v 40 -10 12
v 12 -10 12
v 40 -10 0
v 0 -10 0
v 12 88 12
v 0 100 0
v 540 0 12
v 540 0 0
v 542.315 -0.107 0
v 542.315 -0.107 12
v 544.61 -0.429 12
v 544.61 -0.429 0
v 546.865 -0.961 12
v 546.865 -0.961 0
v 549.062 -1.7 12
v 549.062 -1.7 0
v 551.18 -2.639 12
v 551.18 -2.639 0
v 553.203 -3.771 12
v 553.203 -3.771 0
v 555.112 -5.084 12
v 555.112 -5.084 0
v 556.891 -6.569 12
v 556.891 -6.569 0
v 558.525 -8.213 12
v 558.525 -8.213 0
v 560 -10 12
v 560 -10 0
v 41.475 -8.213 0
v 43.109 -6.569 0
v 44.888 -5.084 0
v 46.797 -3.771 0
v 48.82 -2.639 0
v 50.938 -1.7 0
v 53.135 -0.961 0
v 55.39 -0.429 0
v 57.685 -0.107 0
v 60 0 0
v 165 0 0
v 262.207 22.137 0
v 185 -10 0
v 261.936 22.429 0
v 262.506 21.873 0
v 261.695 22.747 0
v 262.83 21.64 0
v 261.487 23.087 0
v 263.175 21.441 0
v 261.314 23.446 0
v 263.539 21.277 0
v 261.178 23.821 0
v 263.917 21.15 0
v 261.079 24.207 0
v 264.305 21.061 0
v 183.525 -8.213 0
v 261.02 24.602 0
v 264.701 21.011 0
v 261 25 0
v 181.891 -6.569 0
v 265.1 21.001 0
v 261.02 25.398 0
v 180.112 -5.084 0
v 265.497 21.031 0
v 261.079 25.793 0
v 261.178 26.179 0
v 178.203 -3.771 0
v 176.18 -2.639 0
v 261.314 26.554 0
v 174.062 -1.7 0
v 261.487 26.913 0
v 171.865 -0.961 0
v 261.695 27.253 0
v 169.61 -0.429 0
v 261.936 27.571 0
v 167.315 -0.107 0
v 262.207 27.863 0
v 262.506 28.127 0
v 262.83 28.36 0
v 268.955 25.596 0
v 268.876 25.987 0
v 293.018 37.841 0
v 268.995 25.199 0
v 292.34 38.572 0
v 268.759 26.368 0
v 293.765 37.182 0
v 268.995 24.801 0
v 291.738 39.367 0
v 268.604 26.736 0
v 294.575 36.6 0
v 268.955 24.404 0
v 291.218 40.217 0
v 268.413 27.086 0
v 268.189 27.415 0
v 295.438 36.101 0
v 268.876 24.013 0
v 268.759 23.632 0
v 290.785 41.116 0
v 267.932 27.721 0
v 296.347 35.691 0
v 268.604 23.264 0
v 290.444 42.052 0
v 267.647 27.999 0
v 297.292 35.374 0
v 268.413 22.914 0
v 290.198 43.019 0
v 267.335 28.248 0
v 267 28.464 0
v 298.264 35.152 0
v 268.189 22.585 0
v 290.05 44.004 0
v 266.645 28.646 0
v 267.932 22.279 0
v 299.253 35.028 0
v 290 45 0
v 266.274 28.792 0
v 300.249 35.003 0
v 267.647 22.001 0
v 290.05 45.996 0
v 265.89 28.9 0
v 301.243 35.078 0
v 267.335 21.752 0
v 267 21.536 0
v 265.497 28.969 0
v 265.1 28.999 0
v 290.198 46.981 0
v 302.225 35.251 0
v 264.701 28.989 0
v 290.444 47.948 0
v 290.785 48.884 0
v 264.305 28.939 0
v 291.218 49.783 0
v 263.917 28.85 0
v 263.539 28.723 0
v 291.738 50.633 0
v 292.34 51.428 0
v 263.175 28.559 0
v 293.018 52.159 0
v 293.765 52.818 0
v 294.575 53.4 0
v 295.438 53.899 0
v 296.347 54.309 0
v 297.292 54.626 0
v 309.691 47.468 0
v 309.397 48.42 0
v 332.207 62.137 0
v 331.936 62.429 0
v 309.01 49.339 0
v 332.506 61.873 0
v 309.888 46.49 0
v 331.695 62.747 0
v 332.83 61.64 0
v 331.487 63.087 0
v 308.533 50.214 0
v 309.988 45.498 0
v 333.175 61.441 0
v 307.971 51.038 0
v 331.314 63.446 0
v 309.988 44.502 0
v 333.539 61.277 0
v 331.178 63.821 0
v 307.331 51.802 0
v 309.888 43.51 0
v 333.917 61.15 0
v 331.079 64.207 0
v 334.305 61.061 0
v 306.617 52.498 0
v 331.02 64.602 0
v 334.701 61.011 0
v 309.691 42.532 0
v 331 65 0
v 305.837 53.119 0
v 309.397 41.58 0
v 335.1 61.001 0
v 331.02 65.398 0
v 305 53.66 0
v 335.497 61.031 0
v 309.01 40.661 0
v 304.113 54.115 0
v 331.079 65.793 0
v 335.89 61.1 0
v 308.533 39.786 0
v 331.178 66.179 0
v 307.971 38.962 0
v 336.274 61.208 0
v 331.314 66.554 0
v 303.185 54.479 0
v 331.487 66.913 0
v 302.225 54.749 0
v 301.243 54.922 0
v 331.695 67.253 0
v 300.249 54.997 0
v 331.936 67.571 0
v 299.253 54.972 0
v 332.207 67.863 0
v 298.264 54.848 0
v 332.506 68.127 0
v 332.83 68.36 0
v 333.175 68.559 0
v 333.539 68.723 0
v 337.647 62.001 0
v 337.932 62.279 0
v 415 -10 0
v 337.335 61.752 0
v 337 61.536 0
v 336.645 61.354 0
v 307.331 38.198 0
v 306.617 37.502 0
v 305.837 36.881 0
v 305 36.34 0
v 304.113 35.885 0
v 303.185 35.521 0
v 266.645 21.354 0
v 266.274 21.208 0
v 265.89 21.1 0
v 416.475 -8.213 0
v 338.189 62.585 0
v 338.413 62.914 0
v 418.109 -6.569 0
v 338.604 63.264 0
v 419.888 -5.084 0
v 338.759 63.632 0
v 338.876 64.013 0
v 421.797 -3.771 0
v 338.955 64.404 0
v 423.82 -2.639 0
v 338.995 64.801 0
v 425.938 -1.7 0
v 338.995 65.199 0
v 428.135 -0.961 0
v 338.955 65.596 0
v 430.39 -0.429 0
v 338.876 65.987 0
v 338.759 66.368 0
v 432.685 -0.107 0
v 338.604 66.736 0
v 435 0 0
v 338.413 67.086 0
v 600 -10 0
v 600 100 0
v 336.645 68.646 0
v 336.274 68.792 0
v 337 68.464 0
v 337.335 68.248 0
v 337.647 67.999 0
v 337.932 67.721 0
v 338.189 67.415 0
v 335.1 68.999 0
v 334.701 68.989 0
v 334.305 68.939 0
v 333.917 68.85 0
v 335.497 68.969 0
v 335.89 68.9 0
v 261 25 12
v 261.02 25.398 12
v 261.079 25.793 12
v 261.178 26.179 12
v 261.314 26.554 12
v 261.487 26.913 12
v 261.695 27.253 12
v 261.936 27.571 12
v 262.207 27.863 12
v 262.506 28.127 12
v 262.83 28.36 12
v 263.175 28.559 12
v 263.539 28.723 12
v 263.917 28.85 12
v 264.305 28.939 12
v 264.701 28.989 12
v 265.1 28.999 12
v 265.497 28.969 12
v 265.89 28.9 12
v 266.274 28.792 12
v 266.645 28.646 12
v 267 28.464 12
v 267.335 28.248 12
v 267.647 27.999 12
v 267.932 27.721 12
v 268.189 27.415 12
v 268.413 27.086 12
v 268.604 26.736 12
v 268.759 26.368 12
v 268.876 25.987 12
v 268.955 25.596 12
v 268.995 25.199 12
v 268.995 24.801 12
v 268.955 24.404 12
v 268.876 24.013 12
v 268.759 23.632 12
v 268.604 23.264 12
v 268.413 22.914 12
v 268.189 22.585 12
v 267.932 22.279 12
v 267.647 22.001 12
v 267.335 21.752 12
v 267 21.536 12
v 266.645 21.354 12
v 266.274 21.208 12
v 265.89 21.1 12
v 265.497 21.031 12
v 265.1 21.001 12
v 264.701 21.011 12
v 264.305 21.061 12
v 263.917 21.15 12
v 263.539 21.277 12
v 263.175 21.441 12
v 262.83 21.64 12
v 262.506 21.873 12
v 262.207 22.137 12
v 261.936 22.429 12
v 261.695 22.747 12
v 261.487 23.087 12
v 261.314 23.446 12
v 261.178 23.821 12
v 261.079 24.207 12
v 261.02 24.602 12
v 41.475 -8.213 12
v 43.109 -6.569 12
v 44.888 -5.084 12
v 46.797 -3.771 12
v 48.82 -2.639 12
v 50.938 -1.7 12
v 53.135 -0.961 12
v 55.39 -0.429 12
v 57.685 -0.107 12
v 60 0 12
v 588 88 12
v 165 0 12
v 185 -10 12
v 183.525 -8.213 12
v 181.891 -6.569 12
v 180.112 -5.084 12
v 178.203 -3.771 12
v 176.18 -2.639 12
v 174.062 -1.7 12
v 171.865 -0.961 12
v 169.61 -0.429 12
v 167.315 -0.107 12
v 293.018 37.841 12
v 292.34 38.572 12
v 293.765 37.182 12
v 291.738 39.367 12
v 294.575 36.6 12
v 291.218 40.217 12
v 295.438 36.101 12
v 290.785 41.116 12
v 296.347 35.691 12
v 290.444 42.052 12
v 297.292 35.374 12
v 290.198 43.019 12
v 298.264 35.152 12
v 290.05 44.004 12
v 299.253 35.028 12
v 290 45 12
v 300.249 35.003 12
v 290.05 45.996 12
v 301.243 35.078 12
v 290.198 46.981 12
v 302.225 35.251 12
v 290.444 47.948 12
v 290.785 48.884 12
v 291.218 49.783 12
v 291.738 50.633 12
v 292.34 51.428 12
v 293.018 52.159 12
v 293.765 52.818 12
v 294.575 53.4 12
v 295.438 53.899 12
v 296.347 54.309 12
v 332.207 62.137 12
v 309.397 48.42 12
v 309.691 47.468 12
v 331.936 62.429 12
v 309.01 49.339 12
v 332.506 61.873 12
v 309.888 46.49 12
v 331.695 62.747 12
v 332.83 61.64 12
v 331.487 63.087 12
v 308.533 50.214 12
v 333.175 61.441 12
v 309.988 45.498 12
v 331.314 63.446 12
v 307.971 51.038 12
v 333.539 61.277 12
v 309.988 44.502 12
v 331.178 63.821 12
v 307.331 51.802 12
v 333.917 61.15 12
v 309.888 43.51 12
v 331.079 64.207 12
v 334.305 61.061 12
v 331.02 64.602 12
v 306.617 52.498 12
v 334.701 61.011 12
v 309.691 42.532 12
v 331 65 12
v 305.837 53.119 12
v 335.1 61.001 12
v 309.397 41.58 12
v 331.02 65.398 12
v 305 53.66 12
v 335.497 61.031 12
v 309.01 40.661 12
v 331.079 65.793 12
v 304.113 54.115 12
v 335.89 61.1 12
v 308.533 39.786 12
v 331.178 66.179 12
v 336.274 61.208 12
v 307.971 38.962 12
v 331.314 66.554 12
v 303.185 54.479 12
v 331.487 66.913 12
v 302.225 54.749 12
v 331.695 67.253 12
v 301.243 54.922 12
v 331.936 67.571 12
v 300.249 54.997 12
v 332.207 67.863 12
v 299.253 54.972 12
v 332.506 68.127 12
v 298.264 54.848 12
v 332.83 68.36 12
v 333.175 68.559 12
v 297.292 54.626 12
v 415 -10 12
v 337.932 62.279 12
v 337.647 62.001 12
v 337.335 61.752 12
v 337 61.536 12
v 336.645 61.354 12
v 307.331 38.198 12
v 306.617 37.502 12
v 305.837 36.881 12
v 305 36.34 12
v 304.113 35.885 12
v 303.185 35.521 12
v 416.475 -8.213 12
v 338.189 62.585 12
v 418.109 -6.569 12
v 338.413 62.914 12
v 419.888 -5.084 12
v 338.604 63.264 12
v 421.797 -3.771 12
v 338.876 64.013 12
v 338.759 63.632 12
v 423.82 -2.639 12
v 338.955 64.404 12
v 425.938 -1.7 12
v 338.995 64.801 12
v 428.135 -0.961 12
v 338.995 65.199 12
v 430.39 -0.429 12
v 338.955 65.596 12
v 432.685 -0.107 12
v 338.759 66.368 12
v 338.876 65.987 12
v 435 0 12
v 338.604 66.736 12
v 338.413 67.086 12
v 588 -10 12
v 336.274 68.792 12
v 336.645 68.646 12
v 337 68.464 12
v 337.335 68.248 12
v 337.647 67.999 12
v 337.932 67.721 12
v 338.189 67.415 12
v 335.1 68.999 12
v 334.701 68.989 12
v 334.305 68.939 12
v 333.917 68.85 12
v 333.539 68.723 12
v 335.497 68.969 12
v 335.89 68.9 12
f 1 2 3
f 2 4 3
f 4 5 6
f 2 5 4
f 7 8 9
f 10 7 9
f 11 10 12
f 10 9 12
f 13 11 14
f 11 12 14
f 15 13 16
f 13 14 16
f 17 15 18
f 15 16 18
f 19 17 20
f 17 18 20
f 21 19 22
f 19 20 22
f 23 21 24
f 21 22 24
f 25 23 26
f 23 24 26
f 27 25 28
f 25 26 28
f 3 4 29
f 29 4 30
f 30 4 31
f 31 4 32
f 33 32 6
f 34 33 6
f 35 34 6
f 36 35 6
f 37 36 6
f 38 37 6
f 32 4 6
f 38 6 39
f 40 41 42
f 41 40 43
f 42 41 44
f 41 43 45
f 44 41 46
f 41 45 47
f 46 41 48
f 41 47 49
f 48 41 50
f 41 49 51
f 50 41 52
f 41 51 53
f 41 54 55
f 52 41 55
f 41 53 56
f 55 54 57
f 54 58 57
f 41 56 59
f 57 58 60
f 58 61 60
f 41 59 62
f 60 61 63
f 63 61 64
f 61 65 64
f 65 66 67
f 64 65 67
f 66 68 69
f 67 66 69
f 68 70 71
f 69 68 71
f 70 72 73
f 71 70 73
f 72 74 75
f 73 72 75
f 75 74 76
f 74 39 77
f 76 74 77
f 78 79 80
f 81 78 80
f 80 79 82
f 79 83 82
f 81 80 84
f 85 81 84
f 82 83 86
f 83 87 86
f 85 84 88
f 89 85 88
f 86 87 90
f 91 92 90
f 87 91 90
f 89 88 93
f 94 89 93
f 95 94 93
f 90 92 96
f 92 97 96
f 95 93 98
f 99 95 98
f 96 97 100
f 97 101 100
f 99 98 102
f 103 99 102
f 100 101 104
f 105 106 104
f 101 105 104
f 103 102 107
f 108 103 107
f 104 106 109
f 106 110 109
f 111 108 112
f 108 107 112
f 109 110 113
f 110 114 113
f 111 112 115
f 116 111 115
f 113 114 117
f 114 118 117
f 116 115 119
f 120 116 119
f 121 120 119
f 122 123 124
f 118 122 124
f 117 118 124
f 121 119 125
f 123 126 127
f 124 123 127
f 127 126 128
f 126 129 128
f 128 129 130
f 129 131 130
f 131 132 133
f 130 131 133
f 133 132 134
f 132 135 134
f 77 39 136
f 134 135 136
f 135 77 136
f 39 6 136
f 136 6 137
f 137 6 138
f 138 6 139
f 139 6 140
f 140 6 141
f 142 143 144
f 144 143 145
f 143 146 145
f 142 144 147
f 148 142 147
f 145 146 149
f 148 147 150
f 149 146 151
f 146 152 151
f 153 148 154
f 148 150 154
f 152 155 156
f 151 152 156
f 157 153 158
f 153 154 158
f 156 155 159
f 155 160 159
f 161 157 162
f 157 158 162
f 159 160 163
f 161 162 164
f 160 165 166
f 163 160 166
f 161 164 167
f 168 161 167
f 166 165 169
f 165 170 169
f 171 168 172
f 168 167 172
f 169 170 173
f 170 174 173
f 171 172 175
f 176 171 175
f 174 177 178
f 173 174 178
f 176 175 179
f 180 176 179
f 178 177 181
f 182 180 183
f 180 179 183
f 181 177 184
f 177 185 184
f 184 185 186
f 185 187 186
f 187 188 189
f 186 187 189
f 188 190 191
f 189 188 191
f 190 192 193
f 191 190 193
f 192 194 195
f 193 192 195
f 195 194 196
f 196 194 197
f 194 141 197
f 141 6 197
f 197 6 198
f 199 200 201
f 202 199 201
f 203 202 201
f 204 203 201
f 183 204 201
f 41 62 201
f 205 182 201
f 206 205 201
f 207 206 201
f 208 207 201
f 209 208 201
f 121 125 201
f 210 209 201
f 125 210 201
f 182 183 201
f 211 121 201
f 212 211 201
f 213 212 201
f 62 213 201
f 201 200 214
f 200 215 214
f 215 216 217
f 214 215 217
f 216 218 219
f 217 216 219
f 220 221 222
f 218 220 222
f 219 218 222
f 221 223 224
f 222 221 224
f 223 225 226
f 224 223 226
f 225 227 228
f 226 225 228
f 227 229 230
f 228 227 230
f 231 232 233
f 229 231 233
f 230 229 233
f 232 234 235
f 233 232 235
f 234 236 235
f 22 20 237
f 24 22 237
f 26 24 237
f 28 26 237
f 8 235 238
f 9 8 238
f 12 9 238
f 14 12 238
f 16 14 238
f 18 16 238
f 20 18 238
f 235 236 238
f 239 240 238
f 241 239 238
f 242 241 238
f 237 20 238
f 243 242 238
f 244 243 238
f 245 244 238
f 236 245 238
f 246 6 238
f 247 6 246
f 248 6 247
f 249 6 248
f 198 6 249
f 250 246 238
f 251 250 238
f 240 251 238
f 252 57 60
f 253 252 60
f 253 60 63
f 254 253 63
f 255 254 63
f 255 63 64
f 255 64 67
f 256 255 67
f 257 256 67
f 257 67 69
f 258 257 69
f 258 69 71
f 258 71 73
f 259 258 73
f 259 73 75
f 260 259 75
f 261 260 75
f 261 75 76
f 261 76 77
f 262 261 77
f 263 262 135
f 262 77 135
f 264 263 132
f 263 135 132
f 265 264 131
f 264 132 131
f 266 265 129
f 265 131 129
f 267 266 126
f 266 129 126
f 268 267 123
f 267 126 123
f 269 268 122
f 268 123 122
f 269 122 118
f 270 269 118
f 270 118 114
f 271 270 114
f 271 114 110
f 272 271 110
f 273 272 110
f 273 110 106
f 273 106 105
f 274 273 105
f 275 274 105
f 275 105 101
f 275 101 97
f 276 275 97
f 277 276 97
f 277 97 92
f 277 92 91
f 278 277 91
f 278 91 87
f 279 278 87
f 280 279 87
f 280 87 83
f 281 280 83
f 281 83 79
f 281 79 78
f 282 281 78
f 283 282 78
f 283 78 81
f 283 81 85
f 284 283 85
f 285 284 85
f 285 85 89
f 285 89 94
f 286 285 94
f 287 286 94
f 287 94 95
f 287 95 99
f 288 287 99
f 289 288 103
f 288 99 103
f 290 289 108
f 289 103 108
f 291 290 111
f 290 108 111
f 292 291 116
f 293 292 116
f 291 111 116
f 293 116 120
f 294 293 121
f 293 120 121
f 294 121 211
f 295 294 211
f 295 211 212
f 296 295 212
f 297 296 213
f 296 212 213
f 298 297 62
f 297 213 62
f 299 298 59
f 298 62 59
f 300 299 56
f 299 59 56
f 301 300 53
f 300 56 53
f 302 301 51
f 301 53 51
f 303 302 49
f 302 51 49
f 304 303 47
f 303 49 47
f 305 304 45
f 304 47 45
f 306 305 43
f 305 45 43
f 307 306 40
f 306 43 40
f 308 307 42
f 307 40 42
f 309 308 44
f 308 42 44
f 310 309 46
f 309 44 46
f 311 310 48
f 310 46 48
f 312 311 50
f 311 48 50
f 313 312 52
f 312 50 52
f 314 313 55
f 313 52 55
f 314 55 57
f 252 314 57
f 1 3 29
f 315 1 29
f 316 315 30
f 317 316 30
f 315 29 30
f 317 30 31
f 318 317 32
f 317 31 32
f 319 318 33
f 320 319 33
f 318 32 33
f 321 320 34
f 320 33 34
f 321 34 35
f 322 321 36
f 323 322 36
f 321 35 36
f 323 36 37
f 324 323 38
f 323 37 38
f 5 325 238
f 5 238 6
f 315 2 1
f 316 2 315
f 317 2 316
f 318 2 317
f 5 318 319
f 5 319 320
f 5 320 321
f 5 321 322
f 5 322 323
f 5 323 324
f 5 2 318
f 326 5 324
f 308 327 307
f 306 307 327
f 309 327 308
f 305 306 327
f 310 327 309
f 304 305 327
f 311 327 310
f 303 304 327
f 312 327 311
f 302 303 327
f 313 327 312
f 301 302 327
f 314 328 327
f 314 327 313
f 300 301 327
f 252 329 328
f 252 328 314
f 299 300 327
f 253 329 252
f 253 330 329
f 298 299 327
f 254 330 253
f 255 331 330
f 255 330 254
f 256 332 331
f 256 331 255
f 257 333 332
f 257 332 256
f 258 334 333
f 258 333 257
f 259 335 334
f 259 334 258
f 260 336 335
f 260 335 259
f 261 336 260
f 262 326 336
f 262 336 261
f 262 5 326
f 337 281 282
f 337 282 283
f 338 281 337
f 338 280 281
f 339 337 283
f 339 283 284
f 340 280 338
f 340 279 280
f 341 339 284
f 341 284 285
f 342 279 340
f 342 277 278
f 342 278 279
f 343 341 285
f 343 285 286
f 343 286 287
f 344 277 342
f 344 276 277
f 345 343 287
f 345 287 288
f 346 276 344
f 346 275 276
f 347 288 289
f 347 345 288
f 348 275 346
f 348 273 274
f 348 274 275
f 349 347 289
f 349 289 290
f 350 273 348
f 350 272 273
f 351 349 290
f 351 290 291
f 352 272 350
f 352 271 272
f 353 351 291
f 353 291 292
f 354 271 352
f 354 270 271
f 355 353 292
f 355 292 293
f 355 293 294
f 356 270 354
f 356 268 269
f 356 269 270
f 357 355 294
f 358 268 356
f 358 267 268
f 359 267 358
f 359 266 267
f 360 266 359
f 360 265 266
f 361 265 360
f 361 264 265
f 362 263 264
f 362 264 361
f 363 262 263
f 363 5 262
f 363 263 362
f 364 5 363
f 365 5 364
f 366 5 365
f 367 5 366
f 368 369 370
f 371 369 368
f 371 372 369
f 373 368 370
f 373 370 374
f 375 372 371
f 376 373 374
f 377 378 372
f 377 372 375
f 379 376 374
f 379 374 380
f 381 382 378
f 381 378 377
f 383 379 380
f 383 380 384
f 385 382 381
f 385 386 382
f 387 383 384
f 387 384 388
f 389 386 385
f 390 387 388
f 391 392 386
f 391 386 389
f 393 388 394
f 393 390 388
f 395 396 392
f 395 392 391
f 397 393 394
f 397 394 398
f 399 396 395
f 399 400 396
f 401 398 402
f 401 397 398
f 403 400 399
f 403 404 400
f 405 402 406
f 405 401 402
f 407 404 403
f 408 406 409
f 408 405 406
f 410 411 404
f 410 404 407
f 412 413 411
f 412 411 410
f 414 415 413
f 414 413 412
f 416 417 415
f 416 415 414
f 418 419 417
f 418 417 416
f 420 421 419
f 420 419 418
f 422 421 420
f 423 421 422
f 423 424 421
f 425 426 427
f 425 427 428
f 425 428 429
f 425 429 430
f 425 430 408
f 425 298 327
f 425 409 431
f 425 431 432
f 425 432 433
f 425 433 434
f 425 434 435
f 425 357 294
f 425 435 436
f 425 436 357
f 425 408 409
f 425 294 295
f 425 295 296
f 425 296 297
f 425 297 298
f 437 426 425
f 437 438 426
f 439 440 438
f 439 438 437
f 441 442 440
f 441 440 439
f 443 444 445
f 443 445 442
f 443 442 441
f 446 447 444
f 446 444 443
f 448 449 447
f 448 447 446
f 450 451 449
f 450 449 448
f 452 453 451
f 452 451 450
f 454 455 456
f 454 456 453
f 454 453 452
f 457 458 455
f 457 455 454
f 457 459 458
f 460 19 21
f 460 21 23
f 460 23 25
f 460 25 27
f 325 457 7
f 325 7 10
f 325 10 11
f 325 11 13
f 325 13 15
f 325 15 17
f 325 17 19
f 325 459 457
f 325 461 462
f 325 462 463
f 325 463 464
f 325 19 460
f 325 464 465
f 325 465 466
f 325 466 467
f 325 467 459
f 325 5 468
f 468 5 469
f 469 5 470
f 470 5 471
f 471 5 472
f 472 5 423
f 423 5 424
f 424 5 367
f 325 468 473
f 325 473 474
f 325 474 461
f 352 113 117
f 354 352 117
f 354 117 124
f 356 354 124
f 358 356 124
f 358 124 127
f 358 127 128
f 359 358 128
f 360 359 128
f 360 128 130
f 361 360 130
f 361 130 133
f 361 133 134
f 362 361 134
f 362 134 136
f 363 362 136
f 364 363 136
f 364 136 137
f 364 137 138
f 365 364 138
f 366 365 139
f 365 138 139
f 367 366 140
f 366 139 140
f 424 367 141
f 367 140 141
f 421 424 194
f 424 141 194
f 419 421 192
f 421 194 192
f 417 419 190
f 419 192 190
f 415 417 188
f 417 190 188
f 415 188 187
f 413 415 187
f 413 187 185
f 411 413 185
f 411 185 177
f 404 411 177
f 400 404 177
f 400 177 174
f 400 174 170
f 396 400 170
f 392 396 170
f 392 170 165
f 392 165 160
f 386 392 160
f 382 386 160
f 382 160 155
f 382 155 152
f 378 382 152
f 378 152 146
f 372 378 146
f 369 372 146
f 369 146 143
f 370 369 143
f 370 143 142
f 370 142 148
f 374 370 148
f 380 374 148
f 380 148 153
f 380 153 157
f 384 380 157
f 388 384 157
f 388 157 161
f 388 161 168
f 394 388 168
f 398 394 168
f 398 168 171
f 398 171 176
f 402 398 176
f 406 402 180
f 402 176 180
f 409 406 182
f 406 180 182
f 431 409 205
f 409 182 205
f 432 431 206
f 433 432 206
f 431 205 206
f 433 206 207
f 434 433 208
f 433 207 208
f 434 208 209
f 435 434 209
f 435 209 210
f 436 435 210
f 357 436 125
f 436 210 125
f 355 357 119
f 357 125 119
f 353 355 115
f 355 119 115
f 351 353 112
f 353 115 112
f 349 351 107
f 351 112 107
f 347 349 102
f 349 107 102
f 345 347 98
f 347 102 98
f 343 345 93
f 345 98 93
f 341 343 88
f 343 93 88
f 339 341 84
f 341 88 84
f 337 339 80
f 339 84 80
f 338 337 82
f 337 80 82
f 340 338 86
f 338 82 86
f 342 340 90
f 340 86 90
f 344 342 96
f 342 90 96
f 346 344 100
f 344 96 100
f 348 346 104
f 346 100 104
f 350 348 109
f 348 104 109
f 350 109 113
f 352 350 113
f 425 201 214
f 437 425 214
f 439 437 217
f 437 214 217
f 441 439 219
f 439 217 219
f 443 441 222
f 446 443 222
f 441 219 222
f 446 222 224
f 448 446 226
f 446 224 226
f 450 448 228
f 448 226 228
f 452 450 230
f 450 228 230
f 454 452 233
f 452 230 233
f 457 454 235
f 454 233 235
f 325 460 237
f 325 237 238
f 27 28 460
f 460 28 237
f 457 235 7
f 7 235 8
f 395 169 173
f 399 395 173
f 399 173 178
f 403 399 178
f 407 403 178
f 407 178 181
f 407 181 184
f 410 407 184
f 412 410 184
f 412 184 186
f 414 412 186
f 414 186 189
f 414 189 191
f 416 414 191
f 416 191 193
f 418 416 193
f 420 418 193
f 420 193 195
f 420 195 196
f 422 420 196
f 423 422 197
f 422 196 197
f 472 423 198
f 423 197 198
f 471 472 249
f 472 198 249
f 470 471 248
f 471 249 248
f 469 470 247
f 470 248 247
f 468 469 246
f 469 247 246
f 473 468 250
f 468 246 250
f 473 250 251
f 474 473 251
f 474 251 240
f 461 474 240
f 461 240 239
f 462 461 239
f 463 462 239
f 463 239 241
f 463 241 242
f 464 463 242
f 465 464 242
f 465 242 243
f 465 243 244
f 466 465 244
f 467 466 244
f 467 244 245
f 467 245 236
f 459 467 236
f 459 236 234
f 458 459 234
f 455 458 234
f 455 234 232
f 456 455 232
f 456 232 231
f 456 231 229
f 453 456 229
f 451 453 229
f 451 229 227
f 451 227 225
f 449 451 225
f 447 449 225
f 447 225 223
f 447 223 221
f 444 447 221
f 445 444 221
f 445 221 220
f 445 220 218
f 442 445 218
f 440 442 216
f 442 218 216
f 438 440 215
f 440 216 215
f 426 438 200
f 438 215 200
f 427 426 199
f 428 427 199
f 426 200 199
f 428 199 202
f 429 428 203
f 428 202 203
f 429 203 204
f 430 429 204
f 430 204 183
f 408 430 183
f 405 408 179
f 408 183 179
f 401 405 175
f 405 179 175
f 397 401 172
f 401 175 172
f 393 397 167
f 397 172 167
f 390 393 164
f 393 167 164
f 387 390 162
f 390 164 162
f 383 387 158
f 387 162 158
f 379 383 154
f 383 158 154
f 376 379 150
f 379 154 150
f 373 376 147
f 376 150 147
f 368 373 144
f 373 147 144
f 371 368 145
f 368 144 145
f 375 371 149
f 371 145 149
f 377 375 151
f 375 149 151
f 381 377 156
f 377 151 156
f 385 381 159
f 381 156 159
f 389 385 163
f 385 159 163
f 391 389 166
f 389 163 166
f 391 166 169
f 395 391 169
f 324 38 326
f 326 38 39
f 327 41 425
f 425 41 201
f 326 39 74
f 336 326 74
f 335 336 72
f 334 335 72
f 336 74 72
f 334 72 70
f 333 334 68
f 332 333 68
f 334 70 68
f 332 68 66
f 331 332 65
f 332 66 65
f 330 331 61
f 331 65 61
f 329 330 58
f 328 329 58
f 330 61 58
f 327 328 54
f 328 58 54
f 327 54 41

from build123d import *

# Parameters (mm, degrees)
BOSS_EXTRUDE1_DEPTH = 12
CHAMFER1_SIZE       = 12
SKETCH2_R           = 4
SKETCH2_R_2         = 10
CUT_EXTRUDE1_DEPTH  = 609.394608786


with BuildPart() as part:
    # Sketch1 → Boss-Extrude1 (new body)
    with BuildSketch(Plane.XY):
        with BuildLine():
            Line((0, 0), (0, -10))
            Line((0, -10), (40, -10))
            ThreePointArc((40, -10), (48.819660113, -2.639320225), (60, 0))
            Line((60, 0), (165, 0))
            ThreePointArc((165, 0), (176.180339887, -2.639320225), (185, -10))
            Line((185, -10), (415, -10))
            ThreePointArc((415, -10), (423.819660113, -2.639320225), (435, 0))
            Line((435, 0), (540, 0))
            ThreePointArc((540, 0), (551.180339887, -2.639320225), (560, -10))
            Line((560, -10), (600, -10))
            Line((600, -10), (600, 0))
            Line((600, 0), (600, 100))
            Line((600, 100), (0, 100))
            Line((0, 100), (0, 0))
        make_face()
    extrude(amount=BOSS_EXTRUDE1_DEPTH)

    # Chamfer1
    chamfer1_edges = [part.edges().sort_by_distance(p)[0] for p in [
        (300, 100, 12),
        (600, 45, 12),
        (0, 45, 12),
    ]]
    chamfer(chamfer1_edges, length=CHAMFER1_SIZE - 0.0001)  # a hair under: the kernel refuses the full size

    # Sketch2 → Cut-Extrude1 (cut, through all)
    with BuildSketch(Plane(origin=(0, 0, 0), x_dir=(-1, 0, 0), z_dir=(0, 0, -1))):
        with Locations((-335, 65)):
            Circle(SKETCH2_R)
        with Locations((-300, 45)):
            Circle(SKETCH2_R_2)
        with Locations((-265, 25)):
            Circle(SKETCH2_R)
    extrude(amount=-CUT_EXTRUDE1_DEPTH, mode=Mode.SUBTRACT)


solid = part.part
